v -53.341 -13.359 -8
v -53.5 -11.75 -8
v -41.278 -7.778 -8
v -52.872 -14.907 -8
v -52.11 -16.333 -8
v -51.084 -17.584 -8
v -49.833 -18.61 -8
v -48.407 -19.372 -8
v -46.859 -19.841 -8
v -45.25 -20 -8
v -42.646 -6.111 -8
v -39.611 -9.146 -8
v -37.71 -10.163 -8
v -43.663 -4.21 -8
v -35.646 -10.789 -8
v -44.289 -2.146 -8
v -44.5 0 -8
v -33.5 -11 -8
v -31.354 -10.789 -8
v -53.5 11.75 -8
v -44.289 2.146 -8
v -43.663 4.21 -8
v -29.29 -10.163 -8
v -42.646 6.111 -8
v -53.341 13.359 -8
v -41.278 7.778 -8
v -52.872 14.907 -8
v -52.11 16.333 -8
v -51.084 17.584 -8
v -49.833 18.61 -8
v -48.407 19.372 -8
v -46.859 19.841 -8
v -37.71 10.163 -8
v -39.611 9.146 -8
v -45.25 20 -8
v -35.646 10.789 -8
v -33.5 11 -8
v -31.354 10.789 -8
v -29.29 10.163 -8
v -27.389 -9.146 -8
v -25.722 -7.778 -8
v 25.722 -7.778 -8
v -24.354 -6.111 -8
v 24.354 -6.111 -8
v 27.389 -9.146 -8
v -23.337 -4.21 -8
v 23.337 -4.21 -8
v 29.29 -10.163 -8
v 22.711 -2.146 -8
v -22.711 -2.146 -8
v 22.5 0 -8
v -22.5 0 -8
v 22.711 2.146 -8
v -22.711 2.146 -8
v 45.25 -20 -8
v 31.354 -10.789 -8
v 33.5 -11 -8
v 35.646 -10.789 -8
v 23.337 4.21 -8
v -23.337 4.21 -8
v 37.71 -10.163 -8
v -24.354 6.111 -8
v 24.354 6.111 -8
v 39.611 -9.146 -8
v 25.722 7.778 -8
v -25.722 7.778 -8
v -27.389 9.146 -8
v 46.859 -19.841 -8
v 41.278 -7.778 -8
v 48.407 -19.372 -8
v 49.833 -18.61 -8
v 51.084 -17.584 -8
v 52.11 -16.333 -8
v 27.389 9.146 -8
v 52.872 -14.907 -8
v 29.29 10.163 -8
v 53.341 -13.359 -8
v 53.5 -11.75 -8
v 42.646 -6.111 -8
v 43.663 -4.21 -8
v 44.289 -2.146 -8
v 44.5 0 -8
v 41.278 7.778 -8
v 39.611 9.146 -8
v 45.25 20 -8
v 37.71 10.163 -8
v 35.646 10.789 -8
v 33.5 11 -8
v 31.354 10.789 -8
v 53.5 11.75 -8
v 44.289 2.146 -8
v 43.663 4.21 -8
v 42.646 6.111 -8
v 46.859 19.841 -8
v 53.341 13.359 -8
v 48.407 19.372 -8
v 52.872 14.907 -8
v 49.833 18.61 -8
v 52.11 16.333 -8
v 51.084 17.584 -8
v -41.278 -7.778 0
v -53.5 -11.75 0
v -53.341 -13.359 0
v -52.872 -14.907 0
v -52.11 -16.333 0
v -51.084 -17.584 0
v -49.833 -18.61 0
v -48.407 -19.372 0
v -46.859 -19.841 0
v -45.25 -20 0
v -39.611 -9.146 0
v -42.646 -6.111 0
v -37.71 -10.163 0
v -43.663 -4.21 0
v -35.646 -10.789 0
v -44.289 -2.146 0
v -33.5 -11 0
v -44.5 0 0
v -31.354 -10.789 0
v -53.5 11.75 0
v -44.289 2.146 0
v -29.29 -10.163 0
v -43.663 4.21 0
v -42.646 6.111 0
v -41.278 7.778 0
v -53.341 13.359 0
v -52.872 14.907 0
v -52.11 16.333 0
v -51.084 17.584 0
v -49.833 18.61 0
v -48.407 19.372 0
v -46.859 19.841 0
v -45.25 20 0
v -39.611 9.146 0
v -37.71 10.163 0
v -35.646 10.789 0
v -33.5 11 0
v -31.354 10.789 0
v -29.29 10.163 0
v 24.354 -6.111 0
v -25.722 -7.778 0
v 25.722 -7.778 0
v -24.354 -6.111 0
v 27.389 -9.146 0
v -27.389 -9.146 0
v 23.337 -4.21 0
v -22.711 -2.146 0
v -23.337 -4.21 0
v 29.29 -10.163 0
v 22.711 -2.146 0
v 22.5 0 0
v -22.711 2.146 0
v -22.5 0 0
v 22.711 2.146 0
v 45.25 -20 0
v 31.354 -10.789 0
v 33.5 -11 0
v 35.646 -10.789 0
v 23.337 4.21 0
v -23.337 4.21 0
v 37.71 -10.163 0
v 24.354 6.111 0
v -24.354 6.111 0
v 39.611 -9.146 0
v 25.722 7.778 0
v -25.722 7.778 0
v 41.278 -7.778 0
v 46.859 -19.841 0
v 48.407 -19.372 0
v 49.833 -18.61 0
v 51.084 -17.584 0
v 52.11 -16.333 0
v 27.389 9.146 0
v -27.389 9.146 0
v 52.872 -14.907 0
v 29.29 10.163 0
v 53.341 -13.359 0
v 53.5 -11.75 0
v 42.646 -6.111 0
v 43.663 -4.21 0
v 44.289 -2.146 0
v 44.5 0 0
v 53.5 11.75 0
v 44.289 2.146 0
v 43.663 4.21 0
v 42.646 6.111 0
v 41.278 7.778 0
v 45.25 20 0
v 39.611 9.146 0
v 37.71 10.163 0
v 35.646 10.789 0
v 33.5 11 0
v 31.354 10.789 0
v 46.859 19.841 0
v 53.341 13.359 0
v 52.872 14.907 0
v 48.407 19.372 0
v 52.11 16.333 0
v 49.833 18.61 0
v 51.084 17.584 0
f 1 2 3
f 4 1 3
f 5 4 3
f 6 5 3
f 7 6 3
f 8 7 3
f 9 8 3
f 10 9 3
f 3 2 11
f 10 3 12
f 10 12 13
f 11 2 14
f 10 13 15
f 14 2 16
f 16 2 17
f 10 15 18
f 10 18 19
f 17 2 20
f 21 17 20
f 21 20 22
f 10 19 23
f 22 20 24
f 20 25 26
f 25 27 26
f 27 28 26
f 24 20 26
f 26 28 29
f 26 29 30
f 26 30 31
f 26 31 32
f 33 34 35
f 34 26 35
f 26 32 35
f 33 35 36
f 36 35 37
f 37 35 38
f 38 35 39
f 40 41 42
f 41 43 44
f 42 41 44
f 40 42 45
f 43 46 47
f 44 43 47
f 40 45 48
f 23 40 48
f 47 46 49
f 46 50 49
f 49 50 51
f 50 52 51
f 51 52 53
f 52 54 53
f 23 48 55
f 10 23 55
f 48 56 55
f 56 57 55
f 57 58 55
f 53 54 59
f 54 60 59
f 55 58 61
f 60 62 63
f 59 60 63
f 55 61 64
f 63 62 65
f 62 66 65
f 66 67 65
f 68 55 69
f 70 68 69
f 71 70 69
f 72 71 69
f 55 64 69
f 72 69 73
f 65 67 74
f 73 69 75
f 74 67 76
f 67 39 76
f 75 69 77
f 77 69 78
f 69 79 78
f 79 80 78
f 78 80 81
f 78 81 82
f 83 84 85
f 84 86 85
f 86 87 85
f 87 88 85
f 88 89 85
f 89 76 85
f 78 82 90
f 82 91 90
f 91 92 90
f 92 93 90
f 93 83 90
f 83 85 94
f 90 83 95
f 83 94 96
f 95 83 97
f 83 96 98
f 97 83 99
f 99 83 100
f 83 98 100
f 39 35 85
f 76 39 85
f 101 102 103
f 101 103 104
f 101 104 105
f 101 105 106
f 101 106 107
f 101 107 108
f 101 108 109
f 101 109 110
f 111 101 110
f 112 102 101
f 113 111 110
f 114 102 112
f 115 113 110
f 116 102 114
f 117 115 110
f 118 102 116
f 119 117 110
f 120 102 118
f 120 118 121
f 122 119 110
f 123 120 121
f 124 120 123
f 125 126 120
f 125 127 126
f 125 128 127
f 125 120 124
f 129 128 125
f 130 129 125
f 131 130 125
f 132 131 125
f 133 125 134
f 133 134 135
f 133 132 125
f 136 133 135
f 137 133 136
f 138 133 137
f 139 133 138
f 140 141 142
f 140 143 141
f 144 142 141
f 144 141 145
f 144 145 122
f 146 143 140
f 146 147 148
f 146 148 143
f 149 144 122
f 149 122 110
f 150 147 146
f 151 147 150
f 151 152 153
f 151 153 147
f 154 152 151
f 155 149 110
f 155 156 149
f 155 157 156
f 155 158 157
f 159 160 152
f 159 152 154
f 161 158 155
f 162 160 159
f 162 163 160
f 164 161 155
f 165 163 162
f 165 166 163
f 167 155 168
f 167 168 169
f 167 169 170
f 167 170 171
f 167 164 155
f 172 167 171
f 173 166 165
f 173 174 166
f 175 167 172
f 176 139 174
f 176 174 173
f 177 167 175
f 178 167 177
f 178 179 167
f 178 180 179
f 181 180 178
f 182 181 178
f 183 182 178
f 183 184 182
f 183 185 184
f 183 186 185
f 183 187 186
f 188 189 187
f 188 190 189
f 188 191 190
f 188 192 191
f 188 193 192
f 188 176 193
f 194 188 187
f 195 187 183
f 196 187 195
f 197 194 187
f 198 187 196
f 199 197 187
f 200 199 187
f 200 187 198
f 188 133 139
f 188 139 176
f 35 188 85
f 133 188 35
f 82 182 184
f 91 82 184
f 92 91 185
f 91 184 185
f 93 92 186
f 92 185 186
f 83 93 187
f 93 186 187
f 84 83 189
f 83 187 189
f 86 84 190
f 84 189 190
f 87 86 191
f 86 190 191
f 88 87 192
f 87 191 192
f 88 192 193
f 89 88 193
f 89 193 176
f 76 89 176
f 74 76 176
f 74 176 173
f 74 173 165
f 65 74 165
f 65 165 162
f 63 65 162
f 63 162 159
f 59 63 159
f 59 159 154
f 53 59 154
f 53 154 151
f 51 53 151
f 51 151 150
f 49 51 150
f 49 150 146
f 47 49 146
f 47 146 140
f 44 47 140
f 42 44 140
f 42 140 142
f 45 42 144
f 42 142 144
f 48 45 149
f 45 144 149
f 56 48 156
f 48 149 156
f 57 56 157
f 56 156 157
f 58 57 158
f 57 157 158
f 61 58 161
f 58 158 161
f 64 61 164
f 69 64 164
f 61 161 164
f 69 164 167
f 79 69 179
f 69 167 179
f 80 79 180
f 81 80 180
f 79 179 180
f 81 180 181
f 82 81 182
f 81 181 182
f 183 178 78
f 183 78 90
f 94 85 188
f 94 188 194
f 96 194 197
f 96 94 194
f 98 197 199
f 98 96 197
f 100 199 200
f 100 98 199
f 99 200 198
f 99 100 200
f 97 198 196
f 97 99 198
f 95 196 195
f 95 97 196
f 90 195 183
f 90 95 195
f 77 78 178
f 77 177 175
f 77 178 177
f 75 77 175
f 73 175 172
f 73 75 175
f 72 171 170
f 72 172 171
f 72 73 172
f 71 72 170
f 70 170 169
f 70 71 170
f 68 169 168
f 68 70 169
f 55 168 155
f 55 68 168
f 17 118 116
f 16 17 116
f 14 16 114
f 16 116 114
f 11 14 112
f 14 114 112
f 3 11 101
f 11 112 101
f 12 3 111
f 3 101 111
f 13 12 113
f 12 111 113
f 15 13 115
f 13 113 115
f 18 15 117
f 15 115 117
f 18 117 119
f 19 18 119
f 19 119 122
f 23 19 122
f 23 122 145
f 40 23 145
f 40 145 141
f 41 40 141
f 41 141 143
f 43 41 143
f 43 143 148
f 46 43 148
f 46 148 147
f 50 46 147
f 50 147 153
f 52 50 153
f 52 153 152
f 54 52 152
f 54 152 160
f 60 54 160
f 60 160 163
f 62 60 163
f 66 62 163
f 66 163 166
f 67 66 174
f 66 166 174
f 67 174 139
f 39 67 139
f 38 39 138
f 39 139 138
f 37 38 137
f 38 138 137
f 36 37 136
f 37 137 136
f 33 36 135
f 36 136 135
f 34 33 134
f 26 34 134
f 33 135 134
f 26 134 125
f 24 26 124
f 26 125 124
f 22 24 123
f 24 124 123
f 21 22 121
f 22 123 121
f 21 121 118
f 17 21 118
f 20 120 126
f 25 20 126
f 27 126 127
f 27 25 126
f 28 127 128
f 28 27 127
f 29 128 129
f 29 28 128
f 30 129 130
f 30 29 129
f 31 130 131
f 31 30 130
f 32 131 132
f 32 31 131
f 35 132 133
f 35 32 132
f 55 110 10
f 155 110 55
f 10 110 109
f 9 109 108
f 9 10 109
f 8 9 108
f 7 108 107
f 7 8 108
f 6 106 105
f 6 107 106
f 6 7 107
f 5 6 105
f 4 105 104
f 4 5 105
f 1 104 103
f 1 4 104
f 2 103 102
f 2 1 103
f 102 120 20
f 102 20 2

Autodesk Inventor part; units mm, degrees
ref_plane "YZ Plane" through (0, 0, 0) normal (1, 0, 0) x (0, 1, 0)
ref_plane "XZ Plane" through (0, 0, 0) normal (0, 1, 0) x (-1, 0, 0)
ref_plane "XY Plane" through (0, 0, 0) normal (0, 0, 1) x (1, 0, 0)
sketch "Sketch1" plane through (0, 0, 0) normal (0, 0, 1) x (1, 0, 0)
  line L0 (-22.5, 0) -> (22.5, 0) construction
  circle A0 centre (33.5, 0) radius 11
  line L1 (-53.5, -20) -> (53.5, -20)
  line L2 (53.5, -20) -> (53.5, 20)
  line L3 (53.5, 20) -> (-53.5, 20)
  line L4 (-53.5, 20) -> (-53.5, -20)
  line L5 (-53.5, -20) -> (53.5, 20) construction
  line L6 (53.5, -20) -> (-53.5, 20) construction
  point P0 (0, 0)
  point P1 (0, 0)
  dimension "d4" = 22
  dimension "d3" = 45
  dimension "d11" = 20
  dimension "d12" = 20
extrude "Extrusion1" add sketch "Sketch1" against normal blind 8 contours A0 | L4 L3 L2 L1
extrude "Extrusion2" cut sketch "Sketch1" against normal through all contours A0
mirror "Mirror1" about plane through (0, 0, 0) normal (1, 0, 0) of "Extrusion2"
fillet "Fillet1" radius 8.25 4 edges at (-53.5, 20, -4) (53.5, 20, -4) (53.5, -20, -4) (-53.5, -20, -4)
properties part number "WeldAntiWarp"
